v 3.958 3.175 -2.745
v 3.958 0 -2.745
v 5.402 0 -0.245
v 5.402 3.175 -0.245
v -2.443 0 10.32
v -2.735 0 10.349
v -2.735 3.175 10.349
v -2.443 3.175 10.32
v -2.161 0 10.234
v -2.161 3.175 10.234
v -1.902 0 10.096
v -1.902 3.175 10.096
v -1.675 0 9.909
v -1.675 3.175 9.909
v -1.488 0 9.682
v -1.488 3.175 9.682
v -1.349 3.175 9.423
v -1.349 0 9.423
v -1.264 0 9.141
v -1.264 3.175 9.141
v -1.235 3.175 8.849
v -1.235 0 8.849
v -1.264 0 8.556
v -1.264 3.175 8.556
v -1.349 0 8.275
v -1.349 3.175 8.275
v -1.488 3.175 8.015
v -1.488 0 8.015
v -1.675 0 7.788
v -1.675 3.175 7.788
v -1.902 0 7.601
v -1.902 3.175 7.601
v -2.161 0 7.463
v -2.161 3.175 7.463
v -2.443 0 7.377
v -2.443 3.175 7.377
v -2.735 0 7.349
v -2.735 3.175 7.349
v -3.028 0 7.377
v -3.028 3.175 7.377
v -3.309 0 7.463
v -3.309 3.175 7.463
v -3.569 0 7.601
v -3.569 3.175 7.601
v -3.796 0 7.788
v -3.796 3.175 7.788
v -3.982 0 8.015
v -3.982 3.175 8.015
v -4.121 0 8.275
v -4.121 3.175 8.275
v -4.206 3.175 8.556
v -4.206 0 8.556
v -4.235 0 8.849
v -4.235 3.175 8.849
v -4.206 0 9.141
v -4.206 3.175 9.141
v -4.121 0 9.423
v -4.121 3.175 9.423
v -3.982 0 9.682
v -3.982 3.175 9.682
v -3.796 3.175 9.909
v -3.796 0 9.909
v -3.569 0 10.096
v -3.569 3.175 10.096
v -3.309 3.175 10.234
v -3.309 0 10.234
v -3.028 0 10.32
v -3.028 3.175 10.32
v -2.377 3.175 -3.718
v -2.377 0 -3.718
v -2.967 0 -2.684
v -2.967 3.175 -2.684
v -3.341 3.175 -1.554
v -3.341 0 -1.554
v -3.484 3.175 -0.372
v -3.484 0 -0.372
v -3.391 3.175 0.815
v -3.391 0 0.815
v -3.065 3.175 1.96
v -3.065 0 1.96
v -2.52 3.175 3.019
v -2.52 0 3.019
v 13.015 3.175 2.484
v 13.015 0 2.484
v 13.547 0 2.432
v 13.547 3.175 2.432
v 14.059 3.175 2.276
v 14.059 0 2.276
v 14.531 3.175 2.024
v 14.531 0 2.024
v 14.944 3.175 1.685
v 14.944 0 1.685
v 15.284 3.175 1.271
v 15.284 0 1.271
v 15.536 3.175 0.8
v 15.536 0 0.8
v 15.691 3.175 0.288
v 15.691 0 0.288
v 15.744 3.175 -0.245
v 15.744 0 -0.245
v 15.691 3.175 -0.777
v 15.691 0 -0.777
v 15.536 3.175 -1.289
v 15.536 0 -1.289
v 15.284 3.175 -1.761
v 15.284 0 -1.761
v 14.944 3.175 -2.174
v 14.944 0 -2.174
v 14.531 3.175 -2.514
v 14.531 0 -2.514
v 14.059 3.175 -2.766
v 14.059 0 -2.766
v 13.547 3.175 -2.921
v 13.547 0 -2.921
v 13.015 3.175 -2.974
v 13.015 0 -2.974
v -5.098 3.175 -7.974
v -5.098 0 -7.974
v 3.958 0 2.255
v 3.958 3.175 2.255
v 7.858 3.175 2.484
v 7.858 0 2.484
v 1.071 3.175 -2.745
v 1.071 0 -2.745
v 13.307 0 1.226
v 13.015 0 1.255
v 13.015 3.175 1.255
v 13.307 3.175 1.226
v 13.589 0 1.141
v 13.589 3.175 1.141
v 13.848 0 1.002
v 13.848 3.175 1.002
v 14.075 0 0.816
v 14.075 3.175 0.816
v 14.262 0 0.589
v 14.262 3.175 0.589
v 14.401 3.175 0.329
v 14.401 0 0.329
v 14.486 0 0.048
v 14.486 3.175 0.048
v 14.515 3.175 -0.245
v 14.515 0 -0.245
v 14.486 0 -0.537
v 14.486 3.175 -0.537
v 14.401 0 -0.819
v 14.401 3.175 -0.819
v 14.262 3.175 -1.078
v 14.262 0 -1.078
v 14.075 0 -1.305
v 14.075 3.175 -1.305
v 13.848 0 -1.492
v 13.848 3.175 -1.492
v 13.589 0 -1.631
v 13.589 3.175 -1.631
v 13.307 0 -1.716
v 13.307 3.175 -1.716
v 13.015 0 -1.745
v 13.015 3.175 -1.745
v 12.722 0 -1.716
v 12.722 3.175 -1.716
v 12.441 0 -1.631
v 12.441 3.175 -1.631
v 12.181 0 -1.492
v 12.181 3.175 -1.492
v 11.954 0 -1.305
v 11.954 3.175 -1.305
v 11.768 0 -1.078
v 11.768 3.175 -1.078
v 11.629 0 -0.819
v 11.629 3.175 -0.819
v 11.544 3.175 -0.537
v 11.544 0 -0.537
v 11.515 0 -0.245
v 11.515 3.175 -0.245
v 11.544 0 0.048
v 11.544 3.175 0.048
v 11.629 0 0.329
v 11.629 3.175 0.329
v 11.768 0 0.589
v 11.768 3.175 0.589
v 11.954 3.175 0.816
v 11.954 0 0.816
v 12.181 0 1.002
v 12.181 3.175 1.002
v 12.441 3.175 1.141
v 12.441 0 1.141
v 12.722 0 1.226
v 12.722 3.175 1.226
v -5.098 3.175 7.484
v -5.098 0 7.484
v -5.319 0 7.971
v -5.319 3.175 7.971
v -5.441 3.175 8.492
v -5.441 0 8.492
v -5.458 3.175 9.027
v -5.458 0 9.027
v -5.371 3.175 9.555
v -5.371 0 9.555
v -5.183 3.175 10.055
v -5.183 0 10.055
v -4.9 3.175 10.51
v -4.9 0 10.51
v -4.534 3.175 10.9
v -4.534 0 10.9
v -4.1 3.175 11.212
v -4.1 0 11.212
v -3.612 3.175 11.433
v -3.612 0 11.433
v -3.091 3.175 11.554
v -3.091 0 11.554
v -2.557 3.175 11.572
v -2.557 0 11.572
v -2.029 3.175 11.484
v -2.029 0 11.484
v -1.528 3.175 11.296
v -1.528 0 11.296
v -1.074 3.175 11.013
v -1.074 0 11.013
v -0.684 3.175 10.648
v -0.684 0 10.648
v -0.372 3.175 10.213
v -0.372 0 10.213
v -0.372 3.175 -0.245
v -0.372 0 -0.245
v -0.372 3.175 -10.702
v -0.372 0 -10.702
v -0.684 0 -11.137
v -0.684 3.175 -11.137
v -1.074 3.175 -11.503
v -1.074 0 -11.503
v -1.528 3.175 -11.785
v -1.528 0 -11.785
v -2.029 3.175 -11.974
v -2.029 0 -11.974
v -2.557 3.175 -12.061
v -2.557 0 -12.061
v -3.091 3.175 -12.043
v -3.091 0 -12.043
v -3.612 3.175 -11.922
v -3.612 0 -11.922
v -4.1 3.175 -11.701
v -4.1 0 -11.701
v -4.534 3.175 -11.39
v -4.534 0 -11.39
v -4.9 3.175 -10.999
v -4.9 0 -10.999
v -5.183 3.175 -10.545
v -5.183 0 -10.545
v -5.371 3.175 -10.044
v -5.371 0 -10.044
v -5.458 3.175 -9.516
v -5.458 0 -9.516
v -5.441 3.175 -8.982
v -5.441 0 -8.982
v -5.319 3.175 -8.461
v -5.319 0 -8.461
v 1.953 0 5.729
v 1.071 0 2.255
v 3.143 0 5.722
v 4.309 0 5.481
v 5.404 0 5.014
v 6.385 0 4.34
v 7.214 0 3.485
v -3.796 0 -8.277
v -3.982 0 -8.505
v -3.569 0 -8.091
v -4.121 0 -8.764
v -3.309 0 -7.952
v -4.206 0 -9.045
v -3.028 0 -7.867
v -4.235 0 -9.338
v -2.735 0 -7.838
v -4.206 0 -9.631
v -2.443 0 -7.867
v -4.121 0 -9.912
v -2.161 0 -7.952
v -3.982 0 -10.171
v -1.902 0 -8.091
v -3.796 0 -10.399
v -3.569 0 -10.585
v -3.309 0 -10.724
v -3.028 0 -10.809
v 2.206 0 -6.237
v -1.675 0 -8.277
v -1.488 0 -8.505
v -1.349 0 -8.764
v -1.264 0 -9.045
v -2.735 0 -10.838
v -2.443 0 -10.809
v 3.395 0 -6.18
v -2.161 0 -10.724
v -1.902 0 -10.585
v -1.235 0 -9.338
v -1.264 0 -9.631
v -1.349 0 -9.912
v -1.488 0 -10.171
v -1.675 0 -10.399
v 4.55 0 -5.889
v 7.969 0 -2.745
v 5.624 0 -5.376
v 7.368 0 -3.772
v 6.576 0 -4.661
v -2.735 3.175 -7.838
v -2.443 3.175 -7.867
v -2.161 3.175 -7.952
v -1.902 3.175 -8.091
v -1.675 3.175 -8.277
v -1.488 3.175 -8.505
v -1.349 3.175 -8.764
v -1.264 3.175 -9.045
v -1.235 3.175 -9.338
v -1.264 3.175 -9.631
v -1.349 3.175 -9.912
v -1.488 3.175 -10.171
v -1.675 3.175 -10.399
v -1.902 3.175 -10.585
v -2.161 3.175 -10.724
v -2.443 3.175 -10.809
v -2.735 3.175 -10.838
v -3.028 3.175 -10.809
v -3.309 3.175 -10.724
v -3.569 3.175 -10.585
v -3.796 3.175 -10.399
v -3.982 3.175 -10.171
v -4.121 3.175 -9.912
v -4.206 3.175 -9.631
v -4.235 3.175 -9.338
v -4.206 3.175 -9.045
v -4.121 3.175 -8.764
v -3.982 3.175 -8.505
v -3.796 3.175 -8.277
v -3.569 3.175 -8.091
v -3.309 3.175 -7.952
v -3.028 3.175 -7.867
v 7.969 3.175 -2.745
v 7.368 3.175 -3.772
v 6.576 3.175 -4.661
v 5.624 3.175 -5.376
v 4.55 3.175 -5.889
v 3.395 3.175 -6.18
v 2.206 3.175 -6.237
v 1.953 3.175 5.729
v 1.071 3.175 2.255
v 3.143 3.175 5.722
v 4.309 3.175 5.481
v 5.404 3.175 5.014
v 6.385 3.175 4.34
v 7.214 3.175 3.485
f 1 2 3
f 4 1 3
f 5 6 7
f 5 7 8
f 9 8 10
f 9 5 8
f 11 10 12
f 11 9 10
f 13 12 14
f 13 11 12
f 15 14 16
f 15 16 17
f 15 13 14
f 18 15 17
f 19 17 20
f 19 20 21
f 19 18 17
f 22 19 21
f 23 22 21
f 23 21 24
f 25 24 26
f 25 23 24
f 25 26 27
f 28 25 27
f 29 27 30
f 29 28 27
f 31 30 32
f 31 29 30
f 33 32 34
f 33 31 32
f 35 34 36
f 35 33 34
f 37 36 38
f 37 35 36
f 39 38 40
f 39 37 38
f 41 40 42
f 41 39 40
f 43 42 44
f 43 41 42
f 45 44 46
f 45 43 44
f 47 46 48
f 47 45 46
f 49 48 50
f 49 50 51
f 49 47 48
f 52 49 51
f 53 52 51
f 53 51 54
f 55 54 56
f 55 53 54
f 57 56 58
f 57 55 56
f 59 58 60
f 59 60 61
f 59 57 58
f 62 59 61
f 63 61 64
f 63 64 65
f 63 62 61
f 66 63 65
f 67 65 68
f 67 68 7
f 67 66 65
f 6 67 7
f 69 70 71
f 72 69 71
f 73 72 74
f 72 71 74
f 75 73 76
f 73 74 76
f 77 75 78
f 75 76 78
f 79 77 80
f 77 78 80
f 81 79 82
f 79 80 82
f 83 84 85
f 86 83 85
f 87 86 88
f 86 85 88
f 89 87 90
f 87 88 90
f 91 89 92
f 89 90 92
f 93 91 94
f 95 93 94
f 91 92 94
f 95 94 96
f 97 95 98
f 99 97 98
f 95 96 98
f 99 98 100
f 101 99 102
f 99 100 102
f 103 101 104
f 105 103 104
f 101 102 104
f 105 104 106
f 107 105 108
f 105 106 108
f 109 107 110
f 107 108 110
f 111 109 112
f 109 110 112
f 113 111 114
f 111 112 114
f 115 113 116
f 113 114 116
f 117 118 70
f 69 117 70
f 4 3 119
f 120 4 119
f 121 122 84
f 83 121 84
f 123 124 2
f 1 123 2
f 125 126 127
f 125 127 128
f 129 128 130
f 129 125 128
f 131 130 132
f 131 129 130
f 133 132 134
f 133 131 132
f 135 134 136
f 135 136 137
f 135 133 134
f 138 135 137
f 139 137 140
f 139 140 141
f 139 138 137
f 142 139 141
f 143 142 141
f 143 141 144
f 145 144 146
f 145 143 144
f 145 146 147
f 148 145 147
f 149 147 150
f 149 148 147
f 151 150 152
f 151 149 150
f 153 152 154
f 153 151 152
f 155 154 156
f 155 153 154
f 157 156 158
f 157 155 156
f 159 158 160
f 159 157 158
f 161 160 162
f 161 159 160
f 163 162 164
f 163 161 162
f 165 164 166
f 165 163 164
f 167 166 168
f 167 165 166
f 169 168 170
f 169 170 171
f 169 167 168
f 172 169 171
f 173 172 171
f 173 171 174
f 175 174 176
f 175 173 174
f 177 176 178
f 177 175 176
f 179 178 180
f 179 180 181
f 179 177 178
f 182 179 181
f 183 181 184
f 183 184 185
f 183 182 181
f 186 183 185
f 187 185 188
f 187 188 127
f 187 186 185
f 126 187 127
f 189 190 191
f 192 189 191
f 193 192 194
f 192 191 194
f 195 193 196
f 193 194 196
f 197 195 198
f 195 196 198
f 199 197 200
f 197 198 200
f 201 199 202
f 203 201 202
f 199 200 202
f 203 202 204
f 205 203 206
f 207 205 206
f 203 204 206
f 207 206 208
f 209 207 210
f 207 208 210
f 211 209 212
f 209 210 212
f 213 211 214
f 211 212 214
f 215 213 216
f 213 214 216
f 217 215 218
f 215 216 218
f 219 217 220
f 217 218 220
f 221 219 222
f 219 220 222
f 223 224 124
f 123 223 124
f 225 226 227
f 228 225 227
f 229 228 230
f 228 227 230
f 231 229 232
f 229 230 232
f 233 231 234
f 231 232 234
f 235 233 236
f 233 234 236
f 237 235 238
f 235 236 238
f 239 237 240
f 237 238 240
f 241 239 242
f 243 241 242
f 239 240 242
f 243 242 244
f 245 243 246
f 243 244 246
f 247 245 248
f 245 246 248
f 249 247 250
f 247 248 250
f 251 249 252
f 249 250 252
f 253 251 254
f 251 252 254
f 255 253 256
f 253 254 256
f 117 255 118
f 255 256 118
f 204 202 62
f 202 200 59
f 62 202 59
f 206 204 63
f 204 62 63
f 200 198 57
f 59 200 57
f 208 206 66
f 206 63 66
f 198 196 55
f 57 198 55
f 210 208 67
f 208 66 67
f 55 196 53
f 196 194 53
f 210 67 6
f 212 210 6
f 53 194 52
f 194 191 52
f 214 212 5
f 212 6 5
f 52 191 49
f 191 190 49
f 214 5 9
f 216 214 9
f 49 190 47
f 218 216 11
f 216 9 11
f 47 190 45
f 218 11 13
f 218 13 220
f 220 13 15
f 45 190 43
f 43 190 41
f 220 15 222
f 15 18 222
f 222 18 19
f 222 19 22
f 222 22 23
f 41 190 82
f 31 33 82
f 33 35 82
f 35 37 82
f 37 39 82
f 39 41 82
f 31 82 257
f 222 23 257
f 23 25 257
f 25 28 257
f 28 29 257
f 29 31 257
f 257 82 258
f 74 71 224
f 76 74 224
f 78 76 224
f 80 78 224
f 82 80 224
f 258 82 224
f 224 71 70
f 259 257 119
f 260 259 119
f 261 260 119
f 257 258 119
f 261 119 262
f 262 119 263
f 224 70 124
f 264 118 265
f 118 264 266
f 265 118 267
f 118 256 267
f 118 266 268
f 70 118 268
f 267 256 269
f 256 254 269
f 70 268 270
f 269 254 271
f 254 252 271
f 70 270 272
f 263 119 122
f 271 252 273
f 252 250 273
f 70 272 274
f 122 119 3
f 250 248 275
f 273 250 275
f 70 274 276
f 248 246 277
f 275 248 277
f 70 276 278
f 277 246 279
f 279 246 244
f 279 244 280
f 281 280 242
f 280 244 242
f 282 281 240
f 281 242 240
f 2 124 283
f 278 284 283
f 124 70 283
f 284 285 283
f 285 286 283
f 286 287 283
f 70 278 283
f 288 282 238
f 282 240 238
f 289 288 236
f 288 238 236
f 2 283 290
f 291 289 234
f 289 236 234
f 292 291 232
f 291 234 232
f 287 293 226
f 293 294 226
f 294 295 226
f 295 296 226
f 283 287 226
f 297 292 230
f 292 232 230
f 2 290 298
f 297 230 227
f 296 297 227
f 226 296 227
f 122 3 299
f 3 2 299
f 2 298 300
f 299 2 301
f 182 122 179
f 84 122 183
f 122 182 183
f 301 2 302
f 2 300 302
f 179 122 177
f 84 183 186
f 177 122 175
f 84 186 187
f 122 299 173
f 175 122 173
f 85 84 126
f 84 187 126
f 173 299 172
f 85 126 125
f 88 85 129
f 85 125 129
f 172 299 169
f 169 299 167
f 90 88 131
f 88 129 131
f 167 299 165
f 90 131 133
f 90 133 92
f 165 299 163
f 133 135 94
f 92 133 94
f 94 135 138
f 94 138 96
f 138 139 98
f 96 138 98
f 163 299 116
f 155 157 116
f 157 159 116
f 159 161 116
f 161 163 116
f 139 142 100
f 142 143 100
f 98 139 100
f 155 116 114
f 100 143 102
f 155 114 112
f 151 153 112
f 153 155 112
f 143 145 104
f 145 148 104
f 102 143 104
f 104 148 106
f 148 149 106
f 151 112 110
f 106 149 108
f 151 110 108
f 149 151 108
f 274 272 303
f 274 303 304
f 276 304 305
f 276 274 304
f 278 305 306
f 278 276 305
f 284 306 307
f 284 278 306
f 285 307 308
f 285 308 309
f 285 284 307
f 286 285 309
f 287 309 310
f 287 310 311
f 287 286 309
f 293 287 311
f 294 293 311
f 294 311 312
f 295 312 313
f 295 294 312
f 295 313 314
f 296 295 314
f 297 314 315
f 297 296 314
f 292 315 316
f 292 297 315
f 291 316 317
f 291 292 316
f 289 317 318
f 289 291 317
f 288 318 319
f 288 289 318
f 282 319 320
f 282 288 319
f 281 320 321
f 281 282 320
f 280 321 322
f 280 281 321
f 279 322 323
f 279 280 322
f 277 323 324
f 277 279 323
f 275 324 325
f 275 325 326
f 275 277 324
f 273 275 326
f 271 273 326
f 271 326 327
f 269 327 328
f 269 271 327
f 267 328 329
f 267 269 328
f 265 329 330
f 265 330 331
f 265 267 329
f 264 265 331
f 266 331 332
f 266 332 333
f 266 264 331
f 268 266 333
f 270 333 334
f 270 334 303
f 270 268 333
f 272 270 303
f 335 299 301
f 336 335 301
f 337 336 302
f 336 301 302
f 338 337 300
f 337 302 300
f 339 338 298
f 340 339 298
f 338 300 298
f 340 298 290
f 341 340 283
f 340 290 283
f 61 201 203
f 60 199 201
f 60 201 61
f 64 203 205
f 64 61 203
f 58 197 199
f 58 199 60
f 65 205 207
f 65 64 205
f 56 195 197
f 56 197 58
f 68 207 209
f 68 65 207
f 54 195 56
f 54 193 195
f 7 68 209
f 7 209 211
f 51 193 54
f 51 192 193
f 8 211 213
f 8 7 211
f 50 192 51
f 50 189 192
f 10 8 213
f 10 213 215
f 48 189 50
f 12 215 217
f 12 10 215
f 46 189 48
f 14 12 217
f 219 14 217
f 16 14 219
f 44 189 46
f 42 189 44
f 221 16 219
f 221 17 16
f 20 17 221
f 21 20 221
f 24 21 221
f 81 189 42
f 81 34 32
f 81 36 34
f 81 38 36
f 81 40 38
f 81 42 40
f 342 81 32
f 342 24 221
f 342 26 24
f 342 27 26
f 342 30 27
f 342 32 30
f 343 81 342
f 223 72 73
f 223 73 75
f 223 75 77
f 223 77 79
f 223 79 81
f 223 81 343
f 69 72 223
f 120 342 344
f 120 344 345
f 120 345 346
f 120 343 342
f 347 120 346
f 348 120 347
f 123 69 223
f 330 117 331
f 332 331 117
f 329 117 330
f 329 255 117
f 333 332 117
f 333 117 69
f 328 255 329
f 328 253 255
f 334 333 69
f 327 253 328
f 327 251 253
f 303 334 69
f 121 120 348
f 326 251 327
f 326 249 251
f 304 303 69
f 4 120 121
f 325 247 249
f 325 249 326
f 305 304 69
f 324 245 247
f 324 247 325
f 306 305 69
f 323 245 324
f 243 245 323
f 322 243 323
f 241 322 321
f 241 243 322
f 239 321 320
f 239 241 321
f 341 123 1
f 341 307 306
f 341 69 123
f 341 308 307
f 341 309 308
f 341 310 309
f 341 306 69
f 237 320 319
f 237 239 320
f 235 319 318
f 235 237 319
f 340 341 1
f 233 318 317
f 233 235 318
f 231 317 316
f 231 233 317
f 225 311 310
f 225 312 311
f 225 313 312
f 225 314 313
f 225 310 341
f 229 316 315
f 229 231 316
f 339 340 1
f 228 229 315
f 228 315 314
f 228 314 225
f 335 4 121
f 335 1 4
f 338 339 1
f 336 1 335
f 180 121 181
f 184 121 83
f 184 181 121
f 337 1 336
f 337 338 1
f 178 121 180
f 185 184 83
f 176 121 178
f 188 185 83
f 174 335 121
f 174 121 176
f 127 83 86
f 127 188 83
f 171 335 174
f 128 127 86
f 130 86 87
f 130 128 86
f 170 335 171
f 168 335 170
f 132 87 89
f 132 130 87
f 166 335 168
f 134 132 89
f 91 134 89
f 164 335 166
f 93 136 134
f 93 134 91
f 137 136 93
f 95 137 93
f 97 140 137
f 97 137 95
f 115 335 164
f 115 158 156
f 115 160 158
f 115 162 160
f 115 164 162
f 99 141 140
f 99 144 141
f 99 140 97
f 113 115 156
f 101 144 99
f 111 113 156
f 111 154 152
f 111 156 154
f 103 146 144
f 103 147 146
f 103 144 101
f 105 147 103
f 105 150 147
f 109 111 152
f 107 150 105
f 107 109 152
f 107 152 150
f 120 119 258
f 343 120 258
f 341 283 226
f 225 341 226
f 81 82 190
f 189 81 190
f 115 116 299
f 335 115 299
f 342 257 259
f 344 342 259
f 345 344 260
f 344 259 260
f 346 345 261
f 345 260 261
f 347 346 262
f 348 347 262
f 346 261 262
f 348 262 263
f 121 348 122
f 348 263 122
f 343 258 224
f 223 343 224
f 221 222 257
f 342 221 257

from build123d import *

# Parameters (mm, degrees)
SKETCH1_R           = 1.5
BOSS_EXTRUDE1_DEPTH = 3.175


with BuildPart() as part:
    # Sketch1 → Boss-Extrude1 (new body)
    with BuildSketch(Plane(origin=(0, 0, 0), x_dir=(1, 0, 0), z_dir=(0, 1, 0))):
        with BuildLine():
            Line((7.858300919, -2.484134681), (13.014762042, -2.484134681))
            ThreePointArc((13.014762042, -2.484134681), (15.743606535, 0.244709812), (13.014762042, 2.973554305))
            Line((13.014762042, 2.973554305), (7.969118099, 2.744709812))
            ThreePointArc((7.969118099, 2.744709812), (5.624188125, 5.376129638), (2.206241257, 6.236772472))
            Line((2.206241257, 6.236772472), (-0.371989304, 10.702398798))
            ThreePointArc((-0.371989304, 10.702398798), (-4.099660205, 11.701225206), (-5.098486612, 7.973554305))
            Line((-5.098486612, 7.973554305), (-2.377479496, 3.718320719))
            ThreePointArc((-2.377479496, 3.718320719), (-3.483890927, 0.371841879), (-2.520256051, -3.018508355))
            Line((-2.520256051, -3.018508355), (-5.098486612, -7.484134681))
            ThreePointArc((-5.098486612, -7.484134681), (-4.099660205, -11.211805582), (-0.371989304, -10.212979174))
            Line((-0.371989304, -10.212979174), (1.952647522, -5.728901095))
            ThreePointArc((1.952647522, -5.728901095), (5.403988927, -5.013842081), (7.858300919, -2.484134681))
        make_face()
        Polygon((3.958137715, 2.744709812), (5.401513388, 0.244709812), (3.958137715, -2.255290188), (1.071386369, -2.255290188), (-0.371989304, 0.244709812), (1.071386369, 2.744709812), align=None, mode=Mode.SUBTRACT)
        with Locations(Location((13.014762042, 0.244709812, 0), (0, 0, 270))):
            Circle(SKETCH1_R, mode=Mode.SUBTRACT)
        with Locations(Location((-2.735237958, 9.337976552, 0), (0, 0, 270))):
            Circle(SKETCH1_R, mode=Mode.SUBTRACT)
        with Locations(Location((-2.735237958, -8.848556928, 0), (0, 0, 270))):
            Circle(SKETCH1_R, mode=Mode.SUBTRACT)
    extrude(amount=BOSS_EXTRUDE1_DEPTH)


solid = part.part
